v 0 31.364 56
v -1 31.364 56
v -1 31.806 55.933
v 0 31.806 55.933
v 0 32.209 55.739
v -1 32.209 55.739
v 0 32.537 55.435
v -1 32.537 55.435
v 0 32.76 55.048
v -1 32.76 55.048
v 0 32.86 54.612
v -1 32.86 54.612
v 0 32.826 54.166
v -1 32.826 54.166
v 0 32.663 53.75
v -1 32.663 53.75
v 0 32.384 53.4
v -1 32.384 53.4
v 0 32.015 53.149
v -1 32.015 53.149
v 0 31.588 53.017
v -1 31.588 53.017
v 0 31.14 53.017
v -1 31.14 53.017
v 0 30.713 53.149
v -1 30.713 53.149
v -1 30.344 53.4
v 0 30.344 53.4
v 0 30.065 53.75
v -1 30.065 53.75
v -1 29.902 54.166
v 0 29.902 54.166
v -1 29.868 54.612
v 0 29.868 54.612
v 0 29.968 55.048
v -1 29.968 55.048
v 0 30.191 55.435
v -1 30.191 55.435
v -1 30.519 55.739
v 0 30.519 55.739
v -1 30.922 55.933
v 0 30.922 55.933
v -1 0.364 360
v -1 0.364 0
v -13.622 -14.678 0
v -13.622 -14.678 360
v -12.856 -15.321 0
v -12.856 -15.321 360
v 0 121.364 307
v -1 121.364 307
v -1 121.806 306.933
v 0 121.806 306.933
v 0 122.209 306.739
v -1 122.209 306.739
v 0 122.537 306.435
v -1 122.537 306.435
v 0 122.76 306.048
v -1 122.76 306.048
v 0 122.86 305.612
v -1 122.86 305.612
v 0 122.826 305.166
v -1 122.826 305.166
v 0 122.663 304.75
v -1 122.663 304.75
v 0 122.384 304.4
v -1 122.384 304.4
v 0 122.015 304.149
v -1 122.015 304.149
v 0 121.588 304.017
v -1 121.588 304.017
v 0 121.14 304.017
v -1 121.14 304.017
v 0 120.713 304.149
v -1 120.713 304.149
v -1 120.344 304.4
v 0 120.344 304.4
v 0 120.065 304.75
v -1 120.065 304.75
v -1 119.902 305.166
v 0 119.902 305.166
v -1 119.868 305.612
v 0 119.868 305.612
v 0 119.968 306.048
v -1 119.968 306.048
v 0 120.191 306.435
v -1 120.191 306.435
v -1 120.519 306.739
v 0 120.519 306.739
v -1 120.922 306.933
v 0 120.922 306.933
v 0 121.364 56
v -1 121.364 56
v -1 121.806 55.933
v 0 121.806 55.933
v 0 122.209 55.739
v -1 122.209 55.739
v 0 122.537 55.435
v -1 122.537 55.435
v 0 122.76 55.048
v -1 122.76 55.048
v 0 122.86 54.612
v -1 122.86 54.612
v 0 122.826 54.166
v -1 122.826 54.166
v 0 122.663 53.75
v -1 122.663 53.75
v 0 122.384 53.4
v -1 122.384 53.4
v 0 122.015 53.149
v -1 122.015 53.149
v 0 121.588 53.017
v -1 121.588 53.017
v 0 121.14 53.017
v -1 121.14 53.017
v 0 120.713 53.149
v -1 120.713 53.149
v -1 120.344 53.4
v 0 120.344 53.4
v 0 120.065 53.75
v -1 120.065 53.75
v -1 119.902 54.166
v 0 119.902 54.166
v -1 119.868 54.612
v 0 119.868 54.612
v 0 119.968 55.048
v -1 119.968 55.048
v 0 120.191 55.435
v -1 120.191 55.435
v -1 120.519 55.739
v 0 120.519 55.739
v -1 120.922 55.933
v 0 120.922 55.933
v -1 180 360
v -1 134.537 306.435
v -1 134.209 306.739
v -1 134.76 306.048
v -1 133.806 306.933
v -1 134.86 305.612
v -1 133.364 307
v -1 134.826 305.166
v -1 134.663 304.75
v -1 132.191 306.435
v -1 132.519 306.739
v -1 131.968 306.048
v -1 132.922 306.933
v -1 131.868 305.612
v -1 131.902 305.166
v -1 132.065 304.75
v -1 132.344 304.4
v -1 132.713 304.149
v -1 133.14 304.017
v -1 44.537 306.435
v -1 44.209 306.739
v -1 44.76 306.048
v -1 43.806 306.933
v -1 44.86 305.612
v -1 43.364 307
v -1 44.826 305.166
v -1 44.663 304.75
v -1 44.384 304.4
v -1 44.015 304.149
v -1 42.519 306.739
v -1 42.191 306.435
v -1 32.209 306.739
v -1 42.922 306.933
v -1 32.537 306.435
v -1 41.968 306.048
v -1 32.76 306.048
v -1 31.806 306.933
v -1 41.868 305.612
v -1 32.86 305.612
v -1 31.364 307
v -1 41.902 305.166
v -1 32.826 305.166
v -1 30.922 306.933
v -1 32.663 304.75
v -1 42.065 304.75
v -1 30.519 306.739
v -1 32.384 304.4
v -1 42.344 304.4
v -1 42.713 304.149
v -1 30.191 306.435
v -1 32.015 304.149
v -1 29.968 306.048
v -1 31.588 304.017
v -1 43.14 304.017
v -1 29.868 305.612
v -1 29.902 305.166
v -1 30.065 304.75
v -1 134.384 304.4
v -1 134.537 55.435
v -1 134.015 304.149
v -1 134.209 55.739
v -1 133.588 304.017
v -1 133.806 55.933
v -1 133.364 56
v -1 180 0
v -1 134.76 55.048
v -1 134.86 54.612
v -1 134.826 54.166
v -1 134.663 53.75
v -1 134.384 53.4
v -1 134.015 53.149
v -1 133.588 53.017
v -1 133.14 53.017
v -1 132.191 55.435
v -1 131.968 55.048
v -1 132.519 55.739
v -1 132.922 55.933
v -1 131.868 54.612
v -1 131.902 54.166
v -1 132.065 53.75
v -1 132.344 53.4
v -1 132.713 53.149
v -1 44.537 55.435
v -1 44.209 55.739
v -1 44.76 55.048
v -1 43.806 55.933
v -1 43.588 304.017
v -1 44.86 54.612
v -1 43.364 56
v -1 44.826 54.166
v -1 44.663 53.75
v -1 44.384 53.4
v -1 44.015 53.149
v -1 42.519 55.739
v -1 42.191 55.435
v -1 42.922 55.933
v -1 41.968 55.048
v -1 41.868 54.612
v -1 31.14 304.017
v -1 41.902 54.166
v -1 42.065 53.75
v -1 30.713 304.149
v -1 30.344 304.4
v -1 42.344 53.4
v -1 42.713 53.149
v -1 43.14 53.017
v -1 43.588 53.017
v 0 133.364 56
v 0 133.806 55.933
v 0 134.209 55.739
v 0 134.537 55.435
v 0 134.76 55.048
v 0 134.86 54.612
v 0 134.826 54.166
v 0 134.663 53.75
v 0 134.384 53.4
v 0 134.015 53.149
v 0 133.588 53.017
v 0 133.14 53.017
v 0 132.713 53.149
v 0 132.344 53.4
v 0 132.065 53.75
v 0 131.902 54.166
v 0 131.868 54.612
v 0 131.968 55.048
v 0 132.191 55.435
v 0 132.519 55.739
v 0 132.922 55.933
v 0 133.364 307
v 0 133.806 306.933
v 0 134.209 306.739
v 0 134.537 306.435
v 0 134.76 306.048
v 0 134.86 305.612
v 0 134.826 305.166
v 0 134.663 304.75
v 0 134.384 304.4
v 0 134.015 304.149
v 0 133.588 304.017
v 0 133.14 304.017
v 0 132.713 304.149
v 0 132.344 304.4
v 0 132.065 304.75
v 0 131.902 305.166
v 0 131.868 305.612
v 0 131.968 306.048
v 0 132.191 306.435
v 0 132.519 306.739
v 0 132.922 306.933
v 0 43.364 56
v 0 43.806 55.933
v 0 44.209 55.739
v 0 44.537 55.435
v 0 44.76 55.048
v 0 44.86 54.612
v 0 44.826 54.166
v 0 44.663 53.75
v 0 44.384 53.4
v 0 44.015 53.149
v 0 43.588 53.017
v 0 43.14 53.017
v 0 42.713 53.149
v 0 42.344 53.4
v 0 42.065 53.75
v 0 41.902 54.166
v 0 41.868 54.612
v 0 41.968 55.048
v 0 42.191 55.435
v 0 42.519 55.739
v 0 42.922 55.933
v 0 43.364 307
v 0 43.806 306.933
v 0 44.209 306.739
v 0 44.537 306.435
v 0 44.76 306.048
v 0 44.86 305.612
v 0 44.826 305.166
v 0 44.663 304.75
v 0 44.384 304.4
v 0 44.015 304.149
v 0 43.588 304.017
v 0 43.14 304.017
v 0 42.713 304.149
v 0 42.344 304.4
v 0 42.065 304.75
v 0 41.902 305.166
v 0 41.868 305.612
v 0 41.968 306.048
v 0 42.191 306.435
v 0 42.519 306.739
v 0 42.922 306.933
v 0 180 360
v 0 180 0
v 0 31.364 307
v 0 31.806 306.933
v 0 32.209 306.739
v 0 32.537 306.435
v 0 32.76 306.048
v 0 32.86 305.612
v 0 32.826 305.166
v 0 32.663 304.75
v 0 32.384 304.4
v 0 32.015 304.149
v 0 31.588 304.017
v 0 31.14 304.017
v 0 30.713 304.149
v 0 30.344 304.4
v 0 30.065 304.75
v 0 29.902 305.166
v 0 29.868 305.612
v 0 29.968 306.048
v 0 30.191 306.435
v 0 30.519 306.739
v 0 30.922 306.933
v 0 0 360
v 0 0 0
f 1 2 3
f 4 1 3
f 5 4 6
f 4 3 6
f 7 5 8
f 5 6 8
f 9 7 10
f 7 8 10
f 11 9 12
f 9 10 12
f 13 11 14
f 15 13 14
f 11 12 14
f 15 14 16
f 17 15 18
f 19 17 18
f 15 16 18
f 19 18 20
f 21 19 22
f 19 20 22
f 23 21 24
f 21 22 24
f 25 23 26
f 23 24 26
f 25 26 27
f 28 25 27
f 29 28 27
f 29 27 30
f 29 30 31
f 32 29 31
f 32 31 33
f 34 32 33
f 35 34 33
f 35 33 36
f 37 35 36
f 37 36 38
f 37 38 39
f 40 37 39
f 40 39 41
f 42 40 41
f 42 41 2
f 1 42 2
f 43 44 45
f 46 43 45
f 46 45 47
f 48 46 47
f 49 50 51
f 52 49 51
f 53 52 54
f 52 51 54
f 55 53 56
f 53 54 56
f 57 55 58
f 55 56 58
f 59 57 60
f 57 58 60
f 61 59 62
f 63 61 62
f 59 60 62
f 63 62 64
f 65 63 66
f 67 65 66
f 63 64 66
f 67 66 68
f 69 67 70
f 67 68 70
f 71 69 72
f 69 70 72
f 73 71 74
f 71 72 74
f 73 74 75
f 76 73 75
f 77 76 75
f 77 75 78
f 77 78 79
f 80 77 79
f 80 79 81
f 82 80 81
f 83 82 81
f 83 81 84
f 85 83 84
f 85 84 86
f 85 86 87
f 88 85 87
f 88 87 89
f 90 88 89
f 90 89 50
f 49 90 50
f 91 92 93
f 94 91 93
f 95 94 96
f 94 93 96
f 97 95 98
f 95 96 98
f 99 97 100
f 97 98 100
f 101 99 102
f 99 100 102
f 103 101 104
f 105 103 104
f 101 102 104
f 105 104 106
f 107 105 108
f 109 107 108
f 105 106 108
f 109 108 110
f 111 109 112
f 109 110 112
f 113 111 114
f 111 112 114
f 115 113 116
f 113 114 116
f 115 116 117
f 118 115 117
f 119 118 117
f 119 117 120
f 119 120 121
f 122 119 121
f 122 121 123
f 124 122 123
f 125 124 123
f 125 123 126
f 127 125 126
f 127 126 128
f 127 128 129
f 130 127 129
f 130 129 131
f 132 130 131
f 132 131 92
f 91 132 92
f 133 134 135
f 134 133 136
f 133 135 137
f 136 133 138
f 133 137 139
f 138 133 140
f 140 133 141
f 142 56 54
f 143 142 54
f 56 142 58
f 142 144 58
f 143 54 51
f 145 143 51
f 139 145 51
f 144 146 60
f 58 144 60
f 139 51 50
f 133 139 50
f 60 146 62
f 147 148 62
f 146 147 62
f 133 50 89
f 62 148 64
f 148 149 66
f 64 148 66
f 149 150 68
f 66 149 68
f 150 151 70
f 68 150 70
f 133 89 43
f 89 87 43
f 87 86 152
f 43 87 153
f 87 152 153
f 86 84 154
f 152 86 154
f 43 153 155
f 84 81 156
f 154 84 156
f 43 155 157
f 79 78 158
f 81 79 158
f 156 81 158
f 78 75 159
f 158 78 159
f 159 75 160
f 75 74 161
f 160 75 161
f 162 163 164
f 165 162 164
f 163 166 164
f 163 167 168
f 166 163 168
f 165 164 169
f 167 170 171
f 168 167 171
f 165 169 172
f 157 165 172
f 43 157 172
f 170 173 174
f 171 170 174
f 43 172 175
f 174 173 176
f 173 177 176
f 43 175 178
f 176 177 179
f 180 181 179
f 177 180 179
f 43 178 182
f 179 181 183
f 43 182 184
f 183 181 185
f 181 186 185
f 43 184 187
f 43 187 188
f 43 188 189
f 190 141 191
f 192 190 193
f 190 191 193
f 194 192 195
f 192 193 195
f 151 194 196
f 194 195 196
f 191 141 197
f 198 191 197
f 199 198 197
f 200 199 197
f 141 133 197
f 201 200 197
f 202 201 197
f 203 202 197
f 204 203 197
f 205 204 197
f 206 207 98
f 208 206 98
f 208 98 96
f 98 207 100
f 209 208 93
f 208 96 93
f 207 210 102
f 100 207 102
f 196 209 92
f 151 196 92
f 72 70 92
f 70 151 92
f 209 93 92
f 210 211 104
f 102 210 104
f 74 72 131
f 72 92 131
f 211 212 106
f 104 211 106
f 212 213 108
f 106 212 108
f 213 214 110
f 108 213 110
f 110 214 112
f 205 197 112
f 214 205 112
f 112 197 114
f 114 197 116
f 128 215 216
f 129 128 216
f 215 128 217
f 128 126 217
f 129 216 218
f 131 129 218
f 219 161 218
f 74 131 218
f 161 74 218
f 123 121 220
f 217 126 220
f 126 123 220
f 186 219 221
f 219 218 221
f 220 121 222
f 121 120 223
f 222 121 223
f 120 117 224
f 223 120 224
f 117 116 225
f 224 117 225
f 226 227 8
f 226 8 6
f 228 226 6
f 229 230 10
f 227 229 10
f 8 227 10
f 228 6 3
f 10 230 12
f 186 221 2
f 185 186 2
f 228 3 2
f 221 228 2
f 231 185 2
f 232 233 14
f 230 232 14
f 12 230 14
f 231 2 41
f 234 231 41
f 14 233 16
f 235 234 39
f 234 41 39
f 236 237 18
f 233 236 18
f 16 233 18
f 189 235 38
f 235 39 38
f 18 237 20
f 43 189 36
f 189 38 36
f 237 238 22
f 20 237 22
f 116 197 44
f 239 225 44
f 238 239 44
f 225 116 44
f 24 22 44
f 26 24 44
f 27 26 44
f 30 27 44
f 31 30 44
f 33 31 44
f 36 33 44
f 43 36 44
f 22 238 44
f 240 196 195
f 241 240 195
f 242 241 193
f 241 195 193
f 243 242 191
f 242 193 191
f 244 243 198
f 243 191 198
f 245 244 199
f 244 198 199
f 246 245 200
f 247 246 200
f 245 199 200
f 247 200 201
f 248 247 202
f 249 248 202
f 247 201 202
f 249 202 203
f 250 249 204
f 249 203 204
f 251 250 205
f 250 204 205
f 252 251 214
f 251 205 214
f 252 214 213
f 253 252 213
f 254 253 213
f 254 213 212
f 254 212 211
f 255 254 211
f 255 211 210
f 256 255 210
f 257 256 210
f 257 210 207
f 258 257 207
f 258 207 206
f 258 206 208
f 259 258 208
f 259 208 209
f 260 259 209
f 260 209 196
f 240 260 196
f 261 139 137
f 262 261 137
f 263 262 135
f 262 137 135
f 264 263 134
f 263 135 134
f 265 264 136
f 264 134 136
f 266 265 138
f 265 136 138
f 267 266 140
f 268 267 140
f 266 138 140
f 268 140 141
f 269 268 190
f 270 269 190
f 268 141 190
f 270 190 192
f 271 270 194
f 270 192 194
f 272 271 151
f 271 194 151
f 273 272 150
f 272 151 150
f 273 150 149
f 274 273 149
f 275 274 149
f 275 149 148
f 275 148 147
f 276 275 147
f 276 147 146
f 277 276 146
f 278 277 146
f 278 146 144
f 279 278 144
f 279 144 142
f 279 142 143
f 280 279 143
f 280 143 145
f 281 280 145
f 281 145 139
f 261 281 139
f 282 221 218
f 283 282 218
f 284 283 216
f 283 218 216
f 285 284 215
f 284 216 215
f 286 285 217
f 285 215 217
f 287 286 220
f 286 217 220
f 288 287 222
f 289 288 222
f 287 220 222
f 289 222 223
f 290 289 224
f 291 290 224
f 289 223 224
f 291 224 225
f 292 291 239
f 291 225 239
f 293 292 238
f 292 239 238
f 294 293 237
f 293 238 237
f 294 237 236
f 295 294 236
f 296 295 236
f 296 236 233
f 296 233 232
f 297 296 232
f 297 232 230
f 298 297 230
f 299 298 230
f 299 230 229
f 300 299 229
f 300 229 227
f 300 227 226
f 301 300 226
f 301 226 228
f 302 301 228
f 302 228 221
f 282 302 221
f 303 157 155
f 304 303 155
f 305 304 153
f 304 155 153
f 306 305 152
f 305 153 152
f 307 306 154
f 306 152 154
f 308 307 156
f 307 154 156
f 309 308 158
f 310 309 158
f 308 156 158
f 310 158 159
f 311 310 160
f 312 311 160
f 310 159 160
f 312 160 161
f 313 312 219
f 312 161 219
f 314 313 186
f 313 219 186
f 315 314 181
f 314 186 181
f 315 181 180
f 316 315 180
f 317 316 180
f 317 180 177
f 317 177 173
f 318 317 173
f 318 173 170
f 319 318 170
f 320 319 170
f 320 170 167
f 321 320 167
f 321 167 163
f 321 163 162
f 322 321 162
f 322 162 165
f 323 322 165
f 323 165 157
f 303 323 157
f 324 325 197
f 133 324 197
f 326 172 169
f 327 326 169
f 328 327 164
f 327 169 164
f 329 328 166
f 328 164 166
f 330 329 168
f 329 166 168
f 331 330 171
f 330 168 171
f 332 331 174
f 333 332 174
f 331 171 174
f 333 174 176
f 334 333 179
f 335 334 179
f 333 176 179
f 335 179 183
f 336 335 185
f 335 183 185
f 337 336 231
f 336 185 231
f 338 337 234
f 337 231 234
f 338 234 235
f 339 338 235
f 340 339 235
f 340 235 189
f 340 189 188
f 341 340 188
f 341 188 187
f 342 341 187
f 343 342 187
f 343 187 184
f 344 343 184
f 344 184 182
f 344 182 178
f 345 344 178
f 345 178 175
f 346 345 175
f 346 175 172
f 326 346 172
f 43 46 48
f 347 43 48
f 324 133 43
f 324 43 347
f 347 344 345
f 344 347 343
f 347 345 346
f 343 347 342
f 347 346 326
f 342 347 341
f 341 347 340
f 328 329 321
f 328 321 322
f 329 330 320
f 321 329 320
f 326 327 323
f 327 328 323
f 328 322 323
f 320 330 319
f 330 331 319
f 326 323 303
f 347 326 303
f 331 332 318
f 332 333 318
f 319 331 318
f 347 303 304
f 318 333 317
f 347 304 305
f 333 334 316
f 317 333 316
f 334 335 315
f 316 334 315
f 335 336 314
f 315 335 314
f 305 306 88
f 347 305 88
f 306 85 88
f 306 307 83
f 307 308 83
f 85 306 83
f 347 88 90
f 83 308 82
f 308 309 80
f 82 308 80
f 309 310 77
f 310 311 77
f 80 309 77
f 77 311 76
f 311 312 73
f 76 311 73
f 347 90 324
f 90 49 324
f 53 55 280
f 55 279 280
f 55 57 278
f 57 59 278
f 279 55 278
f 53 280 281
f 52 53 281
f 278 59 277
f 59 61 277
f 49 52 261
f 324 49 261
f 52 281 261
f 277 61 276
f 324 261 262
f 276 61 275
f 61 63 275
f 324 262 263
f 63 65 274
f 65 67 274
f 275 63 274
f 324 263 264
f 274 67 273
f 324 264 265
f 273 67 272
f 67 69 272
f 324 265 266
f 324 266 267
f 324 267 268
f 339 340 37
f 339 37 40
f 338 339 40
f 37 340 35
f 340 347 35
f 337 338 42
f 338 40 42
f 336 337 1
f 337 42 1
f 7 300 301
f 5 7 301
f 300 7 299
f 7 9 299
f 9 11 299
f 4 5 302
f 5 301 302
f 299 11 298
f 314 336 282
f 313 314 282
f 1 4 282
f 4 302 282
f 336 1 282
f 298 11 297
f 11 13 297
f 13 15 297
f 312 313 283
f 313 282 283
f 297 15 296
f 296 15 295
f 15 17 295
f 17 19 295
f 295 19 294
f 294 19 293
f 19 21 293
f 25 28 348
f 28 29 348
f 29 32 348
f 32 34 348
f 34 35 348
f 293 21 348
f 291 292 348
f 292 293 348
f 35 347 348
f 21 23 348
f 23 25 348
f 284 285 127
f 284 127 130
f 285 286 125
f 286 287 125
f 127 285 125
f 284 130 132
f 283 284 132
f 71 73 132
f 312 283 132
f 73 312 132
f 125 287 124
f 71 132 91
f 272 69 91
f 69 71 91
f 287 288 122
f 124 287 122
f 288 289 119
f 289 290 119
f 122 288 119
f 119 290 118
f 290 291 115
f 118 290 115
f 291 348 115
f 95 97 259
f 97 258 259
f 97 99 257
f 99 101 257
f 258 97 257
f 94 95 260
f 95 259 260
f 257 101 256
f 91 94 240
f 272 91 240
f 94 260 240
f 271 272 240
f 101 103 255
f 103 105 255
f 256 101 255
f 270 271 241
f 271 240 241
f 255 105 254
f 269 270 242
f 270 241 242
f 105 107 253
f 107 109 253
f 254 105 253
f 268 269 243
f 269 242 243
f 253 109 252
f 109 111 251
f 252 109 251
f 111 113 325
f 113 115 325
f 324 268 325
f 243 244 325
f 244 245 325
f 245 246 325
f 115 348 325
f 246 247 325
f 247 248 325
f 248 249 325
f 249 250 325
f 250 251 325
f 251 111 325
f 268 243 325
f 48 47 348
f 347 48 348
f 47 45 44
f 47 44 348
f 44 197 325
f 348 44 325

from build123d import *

# Parameters (mm, degrees)
EXTRUDE_1_DEPTH     = 360
SKETCH_2_R          = 1.5
CUT_EXTRUDE_1_DEPTH = 380


with BuildPart() as part:
    # 草图1 → 凸台-拉伸1 (new body)
    with BuildSketch(Plane.XY):
        Polygon((0, 0), (0, 180), (-1, 180), (-1, 0.363970234), (-13.621796637, -14.678101253), (-12.855752194, -15.320888862), align=None)
    extrude(amount=EXTRUDE_1_DEPTH)

    # 草图2 → 切除-拉伸1 (cut)
    with BuildSketch(Plane.ZY.offset(1)):
        with Locations((305.5, 31.363970234)):
            Circle(SKETCH_2_R)
        with Locations((305.5, 43.363970234)):
            Circle(SKETCH_2_R)
        with Locations((305.5, 121.363970234)):
            Circle(SKETCH_2_R)
        with Locations((305.5, 133.363970234)):
            Circle(SKETCH_2_R)
        with Locations((54.5, 121.363970234)):
            Circle(SKETCH_2_R)
        with Locations((54.5, 31.363970234)):
            Circle(SKETCH_2_R)
        with Locations((54.5, 43.363970234)):
            Circle(SKETCH_2_R)
        with Locations((54.5, 133.363970234)):
            Circle(SKETCH_2_R)
    extrude(amount=-CUT_EXTRUDE_1_DEPTH, mode=Mode.SUBTRACT)


solid = part.part
